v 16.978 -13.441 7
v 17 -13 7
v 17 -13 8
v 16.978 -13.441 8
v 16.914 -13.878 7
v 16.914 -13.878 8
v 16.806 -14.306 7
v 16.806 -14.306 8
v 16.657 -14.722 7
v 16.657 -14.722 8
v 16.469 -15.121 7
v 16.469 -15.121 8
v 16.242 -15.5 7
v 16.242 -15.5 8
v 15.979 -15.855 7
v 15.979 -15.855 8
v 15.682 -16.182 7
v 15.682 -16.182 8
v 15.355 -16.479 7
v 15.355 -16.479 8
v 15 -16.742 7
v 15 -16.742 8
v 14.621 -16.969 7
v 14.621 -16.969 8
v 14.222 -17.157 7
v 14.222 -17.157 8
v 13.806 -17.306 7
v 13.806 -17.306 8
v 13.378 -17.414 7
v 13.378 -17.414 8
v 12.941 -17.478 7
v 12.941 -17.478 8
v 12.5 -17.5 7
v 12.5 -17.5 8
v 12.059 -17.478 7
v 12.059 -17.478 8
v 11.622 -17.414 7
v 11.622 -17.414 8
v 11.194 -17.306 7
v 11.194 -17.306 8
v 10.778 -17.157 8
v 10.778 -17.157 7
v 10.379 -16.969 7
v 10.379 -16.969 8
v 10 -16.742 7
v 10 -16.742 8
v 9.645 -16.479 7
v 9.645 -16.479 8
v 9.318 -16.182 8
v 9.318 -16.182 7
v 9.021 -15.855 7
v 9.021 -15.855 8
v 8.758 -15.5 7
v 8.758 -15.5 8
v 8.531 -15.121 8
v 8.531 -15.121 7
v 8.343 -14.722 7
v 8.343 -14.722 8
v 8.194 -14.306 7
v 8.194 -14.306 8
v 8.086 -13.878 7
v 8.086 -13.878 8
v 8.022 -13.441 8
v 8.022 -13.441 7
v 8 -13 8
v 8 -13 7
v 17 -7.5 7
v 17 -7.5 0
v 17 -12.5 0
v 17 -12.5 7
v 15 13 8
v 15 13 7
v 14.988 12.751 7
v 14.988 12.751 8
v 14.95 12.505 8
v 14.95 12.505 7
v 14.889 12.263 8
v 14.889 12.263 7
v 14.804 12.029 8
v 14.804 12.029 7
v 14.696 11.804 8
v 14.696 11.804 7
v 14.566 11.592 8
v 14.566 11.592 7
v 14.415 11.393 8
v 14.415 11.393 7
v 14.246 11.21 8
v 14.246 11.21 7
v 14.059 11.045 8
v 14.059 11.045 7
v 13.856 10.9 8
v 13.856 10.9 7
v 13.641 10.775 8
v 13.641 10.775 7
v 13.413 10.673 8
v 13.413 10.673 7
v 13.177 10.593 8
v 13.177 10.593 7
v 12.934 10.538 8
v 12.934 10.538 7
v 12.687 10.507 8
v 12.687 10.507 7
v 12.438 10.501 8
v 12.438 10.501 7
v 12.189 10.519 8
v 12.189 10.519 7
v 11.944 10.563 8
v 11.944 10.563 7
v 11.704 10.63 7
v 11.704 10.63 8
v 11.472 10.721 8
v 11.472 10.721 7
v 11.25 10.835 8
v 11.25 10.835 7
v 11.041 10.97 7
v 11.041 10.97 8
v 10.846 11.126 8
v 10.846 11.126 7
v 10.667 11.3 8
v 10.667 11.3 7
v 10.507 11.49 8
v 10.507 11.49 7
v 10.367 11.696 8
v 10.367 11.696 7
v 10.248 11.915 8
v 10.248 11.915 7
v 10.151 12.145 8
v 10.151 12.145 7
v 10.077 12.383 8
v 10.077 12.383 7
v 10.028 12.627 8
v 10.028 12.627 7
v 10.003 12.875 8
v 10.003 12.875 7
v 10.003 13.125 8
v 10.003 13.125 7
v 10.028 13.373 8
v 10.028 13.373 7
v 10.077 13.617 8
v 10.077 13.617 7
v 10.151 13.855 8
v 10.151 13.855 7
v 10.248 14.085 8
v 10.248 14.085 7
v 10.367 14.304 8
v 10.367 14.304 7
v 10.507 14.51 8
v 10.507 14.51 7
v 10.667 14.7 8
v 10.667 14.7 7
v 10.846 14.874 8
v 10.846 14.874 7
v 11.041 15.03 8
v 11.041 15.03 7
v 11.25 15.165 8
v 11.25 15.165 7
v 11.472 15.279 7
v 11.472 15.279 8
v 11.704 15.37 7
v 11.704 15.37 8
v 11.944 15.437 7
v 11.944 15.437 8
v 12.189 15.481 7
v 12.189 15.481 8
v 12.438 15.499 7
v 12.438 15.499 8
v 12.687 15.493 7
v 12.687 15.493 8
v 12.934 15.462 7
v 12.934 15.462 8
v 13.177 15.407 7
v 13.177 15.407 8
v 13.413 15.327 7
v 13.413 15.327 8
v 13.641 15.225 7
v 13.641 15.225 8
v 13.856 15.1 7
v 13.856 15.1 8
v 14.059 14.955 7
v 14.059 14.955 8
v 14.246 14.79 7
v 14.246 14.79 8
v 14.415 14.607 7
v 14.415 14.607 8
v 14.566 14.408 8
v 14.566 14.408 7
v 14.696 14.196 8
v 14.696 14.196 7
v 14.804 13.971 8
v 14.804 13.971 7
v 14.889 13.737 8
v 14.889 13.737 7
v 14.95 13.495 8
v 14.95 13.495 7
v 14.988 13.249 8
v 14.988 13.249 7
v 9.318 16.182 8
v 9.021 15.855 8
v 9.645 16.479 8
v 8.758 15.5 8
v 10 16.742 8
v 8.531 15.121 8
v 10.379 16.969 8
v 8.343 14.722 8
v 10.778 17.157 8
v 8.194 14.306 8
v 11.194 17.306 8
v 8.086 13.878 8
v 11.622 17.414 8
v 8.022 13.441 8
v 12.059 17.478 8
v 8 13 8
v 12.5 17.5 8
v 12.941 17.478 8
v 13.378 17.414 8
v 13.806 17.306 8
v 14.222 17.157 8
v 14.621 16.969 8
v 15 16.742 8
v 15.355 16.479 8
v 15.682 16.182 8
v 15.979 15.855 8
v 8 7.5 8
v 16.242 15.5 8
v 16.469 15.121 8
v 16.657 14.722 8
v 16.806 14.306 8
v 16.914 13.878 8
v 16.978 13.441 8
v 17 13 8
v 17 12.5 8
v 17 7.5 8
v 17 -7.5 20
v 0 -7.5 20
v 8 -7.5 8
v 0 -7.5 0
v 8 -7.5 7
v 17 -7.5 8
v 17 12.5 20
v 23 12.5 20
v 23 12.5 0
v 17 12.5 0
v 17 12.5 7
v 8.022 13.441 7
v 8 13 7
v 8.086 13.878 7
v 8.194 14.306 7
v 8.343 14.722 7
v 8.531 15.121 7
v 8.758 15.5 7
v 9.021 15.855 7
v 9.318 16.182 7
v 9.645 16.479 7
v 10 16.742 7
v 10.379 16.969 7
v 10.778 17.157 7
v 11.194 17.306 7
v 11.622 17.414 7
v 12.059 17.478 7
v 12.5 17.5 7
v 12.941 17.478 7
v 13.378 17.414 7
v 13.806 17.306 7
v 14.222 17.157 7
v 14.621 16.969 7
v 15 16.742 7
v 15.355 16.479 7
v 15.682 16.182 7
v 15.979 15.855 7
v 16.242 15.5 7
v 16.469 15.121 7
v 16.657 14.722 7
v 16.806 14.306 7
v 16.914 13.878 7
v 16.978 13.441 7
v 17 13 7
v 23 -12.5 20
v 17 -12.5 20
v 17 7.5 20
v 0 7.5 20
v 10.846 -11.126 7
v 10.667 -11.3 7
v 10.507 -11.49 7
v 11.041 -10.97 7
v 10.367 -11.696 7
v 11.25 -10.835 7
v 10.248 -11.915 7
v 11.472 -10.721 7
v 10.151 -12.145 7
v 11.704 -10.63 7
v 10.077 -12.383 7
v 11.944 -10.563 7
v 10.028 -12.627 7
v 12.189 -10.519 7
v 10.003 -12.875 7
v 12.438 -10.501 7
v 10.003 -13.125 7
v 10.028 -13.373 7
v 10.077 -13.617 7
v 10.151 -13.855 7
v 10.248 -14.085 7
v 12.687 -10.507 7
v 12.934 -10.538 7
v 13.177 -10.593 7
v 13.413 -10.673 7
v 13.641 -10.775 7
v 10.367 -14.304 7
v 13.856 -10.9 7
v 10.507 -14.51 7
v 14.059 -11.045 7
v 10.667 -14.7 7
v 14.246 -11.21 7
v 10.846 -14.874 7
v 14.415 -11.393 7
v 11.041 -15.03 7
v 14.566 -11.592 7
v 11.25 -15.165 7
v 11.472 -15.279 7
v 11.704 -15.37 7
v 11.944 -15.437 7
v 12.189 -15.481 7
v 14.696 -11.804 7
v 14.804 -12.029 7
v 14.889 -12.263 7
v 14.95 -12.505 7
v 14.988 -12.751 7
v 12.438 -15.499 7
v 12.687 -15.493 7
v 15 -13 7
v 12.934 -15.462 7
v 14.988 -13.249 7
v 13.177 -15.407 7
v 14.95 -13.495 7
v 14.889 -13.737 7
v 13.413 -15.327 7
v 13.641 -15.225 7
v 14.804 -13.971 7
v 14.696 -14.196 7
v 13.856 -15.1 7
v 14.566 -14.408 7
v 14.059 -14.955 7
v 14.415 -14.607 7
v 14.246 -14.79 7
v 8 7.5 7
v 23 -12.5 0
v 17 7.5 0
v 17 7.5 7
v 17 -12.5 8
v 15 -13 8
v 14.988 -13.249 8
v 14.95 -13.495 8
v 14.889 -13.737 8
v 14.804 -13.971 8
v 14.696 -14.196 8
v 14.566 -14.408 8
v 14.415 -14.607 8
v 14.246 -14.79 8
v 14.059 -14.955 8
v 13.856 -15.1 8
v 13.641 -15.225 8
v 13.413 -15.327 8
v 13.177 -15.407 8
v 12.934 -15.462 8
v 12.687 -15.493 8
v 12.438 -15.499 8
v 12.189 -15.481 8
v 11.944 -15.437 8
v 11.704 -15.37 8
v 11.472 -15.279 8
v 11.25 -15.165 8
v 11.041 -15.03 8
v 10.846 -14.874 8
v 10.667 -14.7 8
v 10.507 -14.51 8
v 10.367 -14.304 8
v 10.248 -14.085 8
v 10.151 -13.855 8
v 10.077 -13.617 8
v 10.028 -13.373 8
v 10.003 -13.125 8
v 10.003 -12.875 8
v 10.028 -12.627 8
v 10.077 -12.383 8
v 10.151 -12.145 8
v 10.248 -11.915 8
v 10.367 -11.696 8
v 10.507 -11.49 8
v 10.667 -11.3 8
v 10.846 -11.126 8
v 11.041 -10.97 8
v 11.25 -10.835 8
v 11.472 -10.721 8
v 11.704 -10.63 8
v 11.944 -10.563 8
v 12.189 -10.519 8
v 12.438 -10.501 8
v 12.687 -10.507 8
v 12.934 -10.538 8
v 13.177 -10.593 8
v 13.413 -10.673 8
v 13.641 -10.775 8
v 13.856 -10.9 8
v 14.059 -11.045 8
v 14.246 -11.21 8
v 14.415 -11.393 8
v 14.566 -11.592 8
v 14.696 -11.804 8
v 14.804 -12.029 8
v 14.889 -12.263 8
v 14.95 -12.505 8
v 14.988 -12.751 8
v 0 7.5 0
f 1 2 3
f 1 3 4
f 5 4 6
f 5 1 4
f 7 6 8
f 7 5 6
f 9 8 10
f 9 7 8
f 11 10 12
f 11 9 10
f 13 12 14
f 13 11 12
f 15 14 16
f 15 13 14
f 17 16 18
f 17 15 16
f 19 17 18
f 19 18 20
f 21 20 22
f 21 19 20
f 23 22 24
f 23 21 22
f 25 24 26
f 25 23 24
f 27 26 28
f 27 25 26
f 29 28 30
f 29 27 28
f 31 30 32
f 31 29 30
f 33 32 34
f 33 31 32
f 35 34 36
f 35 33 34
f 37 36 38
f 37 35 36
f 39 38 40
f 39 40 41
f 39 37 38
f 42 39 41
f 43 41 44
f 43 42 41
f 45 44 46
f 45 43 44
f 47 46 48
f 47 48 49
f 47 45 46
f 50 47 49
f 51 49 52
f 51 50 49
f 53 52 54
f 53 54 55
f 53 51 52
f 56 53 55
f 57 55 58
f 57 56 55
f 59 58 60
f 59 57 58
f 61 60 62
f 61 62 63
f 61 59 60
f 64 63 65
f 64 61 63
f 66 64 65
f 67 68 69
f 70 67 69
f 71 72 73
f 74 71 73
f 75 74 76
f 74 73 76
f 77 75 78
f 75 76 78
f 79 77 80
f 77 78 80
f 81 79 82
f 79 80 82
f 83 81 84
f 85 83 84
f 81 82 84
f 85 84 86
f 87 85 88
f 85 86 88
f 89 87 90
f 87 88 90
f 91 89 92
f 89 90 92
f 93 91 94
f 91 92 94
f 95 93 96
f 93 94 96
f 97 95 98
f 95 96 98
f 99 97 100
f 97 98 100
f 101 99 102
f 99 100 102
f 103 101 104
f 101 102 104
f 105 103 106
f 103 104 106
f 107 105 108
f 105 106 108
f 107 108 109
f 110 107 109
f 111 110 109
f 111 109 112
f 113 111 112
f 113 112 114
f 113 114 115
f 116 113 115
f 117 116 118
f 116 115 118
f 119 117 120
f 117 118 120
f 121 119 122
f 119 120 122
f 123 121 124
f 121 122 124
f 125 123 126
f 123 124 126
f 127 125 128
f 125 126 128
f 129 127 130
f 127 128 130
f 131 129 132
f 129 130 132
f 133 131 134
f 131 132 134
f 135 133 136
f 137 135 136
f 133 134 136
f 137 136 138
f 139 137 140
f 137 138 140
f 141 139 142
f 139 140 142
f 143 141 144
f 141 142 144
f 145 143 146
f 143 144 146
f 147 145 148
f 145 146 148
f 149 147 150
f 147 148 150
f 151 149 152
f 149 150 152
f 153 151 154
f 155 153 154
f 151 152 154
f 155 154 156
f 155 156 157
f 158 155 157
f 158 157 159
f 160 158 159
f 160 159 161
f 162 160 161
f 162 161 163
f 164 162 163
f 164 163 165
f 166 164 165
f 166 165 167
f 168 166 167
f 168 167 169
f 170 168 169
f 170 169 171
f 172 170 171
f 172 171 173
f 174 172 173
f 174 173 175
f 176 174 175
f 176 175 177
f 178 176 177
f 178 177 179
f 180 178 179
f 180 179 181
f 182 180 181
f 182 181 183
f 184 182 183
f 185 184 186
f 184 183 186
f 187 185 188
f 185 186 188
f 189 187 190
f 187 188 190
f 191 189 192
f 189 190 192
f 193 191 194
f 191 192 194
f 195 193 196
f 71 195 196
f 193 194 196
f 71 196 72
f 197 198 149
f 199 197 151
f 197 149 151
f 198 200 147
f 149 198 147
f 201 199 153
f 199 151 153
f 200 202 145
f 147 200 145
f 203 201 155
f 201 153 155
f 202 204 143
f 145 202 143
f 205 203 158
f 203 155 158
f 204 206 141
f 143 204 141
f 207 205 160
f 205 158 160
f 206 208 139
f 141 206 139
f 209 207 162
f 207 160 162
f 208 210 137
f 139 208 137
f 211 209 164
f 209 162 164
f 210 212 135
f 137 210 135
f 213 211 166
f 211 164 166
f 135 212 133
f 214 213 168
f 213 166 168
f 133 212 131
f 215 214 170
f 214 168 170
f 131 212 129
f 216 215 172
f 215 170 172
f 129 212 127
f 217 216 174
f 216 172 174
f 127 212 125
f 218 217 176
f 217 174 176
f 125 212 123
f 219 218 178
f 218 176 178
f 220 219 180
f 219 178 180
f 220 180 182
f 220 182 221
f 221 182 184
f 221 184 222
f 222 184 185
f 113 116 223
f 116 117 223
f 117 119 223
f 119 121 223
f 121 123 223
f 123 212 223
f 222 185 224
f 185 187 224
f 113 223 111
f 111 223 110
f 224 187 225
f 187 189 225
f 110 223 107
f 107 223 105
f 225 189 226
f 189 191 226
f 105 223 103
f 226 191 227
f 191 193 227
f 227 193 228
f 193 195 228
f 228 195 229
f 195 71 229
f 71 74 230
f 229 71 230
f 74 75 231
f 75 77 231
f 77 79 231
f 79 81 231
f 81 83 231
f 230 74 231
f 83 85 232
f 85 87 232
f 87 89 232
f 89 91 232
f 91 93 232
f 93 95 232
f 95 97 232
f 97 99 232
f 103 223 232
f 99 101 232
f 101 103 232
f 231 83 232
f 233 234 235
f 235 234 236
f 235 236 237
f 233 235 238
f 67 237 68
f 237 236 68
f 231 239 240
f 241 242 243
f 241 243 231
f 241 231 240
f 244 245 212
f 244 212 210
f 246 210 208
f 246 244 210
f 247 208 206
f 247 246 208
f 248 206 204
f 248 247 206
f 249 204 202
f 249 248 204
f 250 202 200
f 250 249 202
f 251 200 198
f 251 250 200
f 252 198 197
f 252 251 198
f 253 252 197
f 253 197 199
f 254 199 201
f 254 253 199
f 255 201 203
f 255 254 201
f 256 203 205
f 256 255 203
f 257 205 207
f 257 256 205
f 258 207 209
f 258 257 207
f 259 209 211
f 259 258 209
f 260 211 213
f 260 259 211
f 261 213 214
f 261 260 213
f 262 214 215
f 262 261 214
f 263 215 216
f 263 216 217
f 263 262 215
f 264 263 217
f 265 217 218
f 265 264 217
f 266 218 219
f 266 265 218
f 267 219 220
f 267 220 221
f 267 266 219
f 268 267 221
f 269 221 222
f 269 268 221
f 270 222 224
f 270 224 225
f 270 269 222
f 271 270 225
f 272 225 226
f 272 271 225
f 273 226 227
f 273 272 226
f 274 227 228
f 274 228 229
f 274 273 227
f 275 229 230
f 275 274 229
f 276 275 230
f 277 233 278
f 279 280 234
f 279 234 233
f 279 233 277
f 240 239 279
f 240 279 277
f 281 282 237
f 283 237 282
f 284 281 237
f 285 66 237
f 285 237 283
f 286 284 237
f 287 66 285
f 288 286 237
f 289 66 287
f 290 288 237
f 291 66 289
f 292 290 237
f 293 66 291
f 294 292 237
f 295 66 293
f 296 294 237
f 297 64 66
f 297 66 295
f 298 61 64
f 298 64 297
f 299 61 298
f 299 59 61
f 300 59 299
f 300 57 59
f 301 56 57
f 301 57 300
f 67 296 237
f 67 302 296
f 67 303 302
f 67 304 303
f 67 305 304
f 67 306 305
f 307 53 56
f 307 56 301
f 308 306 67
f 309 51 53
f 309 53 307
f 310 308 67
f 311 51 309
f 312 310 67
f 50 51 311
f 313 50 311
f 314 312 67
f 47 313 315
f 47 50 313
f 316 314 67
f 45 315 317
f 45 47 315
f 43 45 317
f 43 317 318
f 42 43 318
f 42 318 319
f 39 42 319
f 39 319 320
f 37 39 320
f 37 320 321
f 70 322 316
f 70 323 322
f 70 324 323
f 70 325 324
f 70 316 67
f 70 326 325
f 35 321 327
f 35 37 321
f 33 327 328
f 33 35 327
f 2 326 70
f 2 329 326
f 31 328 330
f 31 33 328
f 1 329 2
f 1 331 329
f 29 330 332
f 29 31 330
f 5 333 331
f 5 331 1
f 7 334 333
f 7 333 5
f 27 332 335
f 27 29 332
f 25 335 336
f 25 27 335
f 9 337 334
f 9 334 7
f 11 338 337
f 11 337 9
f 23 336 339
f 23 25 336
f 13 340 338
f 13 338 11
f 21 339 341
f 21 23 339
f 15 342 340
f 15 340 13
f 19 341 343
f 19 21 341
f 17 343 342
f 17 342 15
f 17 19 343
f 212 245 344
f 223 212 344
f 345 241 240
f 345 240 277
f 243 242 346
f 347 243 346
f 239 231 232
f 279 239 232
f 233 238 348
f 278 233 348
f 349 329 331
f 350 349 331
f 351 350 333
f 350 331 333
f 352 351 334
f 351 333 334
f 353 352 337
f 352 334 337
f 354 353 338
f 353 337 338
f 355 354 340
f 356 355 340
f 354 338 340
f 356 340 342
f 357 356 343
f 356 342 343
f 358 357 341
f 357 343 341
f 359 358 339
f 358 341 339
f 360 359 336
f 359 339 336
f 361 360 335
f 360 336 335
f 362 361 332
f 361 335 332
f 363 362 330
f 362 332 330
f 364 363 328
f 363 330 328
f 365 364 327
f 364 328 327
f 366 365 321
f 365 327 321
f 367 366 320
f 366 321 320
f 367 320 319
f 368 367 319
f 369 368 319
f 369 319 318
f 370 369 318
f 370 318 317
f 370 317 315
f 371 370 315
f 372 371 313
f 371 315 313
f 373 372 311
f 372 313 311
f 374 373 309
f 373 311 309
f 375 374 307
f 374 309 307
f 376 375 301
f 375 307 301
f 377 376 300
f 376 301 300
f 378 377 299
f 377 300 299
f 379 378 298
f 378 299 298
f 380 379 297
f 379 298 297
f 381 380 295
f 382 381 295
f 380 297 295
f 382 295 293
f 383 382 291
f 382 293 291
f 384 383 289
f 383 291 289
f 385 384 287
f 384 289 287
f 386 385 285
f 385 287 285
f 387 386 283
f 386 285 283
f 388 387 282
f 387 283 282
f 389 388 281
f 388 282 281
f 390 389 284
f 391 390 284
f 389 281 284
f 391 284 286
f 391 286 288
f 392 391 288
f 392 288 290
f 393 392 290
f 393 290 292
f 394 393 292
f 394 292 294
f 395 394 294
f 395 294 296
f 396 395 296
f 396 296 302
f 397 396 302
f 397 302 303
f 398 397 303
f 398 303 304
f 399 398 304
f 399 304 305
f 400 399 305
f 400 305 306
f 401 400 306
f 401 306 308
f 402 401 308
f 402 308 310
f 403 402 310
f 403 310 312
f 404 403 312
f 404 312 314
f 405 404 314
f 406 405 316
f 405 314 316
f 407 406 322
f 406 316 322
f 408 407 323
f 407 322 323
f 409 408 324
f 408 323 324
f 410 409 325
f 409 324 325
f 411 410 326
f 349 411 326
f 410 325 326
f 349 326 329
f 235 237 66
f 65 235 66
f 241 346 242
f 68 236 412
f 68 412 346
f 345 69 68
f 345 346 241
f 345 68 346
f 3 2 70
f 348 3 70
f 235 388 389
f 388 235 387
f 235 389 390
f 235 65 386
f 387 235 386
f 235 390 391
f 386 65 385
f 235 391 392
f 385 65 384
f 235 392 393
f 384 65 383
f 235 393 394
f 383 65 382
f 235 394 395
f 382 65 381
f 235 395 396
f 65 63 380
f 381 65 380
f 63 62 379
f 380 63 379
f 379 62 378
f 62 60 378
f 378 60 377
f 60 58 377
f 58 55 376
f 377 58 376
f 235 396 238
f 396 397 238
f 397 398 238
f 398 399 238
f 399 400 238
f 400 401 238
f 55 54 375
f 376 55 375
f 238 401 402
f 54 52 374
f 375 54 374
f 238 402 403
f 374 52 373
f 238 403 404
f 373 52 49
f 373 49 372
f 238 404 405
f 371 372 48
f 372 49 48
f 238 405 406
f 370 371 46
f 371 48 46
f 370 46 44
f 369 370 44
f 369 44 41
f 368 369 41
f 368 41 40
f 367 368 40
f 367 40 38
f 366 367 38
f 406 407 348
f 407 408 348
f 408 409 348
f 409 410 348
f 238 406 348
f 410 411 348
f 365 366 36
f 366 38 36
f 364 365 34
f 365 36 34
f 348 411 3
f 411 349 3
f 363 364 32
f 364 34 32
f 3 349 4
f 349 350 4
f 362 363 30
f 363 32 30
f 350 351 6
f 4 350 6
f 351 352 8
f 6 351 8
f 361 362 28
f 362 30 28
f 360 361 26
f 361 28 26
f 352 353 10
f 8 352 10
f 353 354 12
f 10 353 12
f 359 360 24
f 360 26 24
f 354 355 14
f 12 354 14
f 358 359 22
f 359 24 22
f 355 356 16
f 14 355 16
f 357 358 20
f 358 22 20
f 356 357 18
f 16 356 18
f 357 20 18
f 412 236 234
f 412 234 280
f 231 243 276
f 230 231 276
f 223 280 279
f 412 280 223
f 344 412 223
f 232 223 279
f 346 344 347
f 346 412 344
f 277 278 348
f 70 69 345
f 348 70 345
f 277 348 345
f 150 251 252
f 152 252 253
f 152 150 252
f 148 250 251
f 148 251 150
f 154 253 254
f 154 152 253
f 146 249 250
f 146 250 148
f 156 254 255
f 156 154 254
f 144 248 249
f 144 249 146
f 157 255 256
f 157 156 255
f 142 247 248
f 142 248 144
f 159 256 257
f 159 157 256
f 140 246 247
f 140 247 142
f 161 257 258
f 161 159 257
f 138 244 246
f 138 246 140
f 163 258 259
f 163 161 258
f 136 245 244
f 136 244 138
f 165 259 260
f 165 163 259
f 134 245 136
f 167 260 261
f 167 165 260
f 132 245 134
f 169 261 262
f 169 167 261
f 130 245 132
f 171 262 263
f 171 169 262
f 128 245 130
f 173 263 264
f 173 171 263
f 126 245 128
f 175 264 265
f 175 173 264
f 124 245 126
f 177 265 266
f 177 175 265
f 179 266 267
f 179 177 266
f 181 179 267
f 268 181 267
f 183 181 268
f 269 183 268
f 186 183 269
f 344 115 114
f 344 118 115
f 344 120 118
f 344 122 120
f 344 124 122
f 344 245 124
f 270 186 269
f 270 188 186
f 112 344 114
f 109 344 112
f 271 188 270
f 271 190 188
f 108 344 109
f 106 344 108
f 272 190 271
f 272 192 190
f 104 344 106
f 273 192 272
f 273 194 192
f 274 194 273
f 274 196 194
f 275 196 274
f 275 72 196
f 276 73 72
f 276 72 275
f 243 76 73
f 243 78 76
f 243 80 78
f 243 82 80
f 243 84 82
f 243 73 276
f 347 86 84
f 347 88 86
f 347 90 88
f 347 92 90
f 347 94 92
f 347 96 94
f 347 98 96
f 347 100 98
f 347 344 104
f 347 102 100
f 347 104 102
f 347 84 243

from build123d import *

# Parameters (mm, degrees)
SKETCH_W     = 23
SKETCH_H     = 15
PAD_DEPTH    = 20
SKETCH001_R  = 2.5
PAD001_DEPTH = 1
SKETCH002_W  = 6
SKETCH002_H  = 25
PAD002_DEPTH = 20


with BuildPart() as part:
    # Sketch → Pad (new body)
    with BuildSketch(Plane.XY):
        with Locations((11.5, 0)):
            Rectangle(SKETCH_W, SKETCH_H)
    extrude(amount=PAD_DEPTH)

    # Sketch001 (on Face5 of Pad) → Pad001 (join)
    with BuildSketch(Plane(origin=(0, 0, 7), x_dir=(1, 0, 0), z_dir=(0, 0, -1))):
        with BuildLine():
            ThreePointArc((8, -13), (12.5, -17.5), (17, -13))
            Line((17, 13), (17, -13))
            ThreePointArc((17, 13), (12.5, 17.5), (8, 13))
            Line((8, -13), (8, 13))
        make_face()
        with Locations((12.5, -13)):
            Circle(SKETCH001_R, mode=Mode.SUBTRACT)
        with Locations((12.5, 13)):
            Circle(SKETCH001_R, mode=Mode.SUBTRACT)
    extrude(amount=-PAD001_DEPTH)

    # Sketch002 (on Face3 of Pad001) → Pad002 (join)
    with BuildSketch(Plane(origin=(0, 0, 0), x_dir=(1, 0, 0), z_dir=(0, 0, -1))):
        with Locations((20, 0)):
            Rectangle(SKETCH002_W, SKETCH002_H)
    extrude(amount=-PAD002_DEPTH)


solid = part.part
